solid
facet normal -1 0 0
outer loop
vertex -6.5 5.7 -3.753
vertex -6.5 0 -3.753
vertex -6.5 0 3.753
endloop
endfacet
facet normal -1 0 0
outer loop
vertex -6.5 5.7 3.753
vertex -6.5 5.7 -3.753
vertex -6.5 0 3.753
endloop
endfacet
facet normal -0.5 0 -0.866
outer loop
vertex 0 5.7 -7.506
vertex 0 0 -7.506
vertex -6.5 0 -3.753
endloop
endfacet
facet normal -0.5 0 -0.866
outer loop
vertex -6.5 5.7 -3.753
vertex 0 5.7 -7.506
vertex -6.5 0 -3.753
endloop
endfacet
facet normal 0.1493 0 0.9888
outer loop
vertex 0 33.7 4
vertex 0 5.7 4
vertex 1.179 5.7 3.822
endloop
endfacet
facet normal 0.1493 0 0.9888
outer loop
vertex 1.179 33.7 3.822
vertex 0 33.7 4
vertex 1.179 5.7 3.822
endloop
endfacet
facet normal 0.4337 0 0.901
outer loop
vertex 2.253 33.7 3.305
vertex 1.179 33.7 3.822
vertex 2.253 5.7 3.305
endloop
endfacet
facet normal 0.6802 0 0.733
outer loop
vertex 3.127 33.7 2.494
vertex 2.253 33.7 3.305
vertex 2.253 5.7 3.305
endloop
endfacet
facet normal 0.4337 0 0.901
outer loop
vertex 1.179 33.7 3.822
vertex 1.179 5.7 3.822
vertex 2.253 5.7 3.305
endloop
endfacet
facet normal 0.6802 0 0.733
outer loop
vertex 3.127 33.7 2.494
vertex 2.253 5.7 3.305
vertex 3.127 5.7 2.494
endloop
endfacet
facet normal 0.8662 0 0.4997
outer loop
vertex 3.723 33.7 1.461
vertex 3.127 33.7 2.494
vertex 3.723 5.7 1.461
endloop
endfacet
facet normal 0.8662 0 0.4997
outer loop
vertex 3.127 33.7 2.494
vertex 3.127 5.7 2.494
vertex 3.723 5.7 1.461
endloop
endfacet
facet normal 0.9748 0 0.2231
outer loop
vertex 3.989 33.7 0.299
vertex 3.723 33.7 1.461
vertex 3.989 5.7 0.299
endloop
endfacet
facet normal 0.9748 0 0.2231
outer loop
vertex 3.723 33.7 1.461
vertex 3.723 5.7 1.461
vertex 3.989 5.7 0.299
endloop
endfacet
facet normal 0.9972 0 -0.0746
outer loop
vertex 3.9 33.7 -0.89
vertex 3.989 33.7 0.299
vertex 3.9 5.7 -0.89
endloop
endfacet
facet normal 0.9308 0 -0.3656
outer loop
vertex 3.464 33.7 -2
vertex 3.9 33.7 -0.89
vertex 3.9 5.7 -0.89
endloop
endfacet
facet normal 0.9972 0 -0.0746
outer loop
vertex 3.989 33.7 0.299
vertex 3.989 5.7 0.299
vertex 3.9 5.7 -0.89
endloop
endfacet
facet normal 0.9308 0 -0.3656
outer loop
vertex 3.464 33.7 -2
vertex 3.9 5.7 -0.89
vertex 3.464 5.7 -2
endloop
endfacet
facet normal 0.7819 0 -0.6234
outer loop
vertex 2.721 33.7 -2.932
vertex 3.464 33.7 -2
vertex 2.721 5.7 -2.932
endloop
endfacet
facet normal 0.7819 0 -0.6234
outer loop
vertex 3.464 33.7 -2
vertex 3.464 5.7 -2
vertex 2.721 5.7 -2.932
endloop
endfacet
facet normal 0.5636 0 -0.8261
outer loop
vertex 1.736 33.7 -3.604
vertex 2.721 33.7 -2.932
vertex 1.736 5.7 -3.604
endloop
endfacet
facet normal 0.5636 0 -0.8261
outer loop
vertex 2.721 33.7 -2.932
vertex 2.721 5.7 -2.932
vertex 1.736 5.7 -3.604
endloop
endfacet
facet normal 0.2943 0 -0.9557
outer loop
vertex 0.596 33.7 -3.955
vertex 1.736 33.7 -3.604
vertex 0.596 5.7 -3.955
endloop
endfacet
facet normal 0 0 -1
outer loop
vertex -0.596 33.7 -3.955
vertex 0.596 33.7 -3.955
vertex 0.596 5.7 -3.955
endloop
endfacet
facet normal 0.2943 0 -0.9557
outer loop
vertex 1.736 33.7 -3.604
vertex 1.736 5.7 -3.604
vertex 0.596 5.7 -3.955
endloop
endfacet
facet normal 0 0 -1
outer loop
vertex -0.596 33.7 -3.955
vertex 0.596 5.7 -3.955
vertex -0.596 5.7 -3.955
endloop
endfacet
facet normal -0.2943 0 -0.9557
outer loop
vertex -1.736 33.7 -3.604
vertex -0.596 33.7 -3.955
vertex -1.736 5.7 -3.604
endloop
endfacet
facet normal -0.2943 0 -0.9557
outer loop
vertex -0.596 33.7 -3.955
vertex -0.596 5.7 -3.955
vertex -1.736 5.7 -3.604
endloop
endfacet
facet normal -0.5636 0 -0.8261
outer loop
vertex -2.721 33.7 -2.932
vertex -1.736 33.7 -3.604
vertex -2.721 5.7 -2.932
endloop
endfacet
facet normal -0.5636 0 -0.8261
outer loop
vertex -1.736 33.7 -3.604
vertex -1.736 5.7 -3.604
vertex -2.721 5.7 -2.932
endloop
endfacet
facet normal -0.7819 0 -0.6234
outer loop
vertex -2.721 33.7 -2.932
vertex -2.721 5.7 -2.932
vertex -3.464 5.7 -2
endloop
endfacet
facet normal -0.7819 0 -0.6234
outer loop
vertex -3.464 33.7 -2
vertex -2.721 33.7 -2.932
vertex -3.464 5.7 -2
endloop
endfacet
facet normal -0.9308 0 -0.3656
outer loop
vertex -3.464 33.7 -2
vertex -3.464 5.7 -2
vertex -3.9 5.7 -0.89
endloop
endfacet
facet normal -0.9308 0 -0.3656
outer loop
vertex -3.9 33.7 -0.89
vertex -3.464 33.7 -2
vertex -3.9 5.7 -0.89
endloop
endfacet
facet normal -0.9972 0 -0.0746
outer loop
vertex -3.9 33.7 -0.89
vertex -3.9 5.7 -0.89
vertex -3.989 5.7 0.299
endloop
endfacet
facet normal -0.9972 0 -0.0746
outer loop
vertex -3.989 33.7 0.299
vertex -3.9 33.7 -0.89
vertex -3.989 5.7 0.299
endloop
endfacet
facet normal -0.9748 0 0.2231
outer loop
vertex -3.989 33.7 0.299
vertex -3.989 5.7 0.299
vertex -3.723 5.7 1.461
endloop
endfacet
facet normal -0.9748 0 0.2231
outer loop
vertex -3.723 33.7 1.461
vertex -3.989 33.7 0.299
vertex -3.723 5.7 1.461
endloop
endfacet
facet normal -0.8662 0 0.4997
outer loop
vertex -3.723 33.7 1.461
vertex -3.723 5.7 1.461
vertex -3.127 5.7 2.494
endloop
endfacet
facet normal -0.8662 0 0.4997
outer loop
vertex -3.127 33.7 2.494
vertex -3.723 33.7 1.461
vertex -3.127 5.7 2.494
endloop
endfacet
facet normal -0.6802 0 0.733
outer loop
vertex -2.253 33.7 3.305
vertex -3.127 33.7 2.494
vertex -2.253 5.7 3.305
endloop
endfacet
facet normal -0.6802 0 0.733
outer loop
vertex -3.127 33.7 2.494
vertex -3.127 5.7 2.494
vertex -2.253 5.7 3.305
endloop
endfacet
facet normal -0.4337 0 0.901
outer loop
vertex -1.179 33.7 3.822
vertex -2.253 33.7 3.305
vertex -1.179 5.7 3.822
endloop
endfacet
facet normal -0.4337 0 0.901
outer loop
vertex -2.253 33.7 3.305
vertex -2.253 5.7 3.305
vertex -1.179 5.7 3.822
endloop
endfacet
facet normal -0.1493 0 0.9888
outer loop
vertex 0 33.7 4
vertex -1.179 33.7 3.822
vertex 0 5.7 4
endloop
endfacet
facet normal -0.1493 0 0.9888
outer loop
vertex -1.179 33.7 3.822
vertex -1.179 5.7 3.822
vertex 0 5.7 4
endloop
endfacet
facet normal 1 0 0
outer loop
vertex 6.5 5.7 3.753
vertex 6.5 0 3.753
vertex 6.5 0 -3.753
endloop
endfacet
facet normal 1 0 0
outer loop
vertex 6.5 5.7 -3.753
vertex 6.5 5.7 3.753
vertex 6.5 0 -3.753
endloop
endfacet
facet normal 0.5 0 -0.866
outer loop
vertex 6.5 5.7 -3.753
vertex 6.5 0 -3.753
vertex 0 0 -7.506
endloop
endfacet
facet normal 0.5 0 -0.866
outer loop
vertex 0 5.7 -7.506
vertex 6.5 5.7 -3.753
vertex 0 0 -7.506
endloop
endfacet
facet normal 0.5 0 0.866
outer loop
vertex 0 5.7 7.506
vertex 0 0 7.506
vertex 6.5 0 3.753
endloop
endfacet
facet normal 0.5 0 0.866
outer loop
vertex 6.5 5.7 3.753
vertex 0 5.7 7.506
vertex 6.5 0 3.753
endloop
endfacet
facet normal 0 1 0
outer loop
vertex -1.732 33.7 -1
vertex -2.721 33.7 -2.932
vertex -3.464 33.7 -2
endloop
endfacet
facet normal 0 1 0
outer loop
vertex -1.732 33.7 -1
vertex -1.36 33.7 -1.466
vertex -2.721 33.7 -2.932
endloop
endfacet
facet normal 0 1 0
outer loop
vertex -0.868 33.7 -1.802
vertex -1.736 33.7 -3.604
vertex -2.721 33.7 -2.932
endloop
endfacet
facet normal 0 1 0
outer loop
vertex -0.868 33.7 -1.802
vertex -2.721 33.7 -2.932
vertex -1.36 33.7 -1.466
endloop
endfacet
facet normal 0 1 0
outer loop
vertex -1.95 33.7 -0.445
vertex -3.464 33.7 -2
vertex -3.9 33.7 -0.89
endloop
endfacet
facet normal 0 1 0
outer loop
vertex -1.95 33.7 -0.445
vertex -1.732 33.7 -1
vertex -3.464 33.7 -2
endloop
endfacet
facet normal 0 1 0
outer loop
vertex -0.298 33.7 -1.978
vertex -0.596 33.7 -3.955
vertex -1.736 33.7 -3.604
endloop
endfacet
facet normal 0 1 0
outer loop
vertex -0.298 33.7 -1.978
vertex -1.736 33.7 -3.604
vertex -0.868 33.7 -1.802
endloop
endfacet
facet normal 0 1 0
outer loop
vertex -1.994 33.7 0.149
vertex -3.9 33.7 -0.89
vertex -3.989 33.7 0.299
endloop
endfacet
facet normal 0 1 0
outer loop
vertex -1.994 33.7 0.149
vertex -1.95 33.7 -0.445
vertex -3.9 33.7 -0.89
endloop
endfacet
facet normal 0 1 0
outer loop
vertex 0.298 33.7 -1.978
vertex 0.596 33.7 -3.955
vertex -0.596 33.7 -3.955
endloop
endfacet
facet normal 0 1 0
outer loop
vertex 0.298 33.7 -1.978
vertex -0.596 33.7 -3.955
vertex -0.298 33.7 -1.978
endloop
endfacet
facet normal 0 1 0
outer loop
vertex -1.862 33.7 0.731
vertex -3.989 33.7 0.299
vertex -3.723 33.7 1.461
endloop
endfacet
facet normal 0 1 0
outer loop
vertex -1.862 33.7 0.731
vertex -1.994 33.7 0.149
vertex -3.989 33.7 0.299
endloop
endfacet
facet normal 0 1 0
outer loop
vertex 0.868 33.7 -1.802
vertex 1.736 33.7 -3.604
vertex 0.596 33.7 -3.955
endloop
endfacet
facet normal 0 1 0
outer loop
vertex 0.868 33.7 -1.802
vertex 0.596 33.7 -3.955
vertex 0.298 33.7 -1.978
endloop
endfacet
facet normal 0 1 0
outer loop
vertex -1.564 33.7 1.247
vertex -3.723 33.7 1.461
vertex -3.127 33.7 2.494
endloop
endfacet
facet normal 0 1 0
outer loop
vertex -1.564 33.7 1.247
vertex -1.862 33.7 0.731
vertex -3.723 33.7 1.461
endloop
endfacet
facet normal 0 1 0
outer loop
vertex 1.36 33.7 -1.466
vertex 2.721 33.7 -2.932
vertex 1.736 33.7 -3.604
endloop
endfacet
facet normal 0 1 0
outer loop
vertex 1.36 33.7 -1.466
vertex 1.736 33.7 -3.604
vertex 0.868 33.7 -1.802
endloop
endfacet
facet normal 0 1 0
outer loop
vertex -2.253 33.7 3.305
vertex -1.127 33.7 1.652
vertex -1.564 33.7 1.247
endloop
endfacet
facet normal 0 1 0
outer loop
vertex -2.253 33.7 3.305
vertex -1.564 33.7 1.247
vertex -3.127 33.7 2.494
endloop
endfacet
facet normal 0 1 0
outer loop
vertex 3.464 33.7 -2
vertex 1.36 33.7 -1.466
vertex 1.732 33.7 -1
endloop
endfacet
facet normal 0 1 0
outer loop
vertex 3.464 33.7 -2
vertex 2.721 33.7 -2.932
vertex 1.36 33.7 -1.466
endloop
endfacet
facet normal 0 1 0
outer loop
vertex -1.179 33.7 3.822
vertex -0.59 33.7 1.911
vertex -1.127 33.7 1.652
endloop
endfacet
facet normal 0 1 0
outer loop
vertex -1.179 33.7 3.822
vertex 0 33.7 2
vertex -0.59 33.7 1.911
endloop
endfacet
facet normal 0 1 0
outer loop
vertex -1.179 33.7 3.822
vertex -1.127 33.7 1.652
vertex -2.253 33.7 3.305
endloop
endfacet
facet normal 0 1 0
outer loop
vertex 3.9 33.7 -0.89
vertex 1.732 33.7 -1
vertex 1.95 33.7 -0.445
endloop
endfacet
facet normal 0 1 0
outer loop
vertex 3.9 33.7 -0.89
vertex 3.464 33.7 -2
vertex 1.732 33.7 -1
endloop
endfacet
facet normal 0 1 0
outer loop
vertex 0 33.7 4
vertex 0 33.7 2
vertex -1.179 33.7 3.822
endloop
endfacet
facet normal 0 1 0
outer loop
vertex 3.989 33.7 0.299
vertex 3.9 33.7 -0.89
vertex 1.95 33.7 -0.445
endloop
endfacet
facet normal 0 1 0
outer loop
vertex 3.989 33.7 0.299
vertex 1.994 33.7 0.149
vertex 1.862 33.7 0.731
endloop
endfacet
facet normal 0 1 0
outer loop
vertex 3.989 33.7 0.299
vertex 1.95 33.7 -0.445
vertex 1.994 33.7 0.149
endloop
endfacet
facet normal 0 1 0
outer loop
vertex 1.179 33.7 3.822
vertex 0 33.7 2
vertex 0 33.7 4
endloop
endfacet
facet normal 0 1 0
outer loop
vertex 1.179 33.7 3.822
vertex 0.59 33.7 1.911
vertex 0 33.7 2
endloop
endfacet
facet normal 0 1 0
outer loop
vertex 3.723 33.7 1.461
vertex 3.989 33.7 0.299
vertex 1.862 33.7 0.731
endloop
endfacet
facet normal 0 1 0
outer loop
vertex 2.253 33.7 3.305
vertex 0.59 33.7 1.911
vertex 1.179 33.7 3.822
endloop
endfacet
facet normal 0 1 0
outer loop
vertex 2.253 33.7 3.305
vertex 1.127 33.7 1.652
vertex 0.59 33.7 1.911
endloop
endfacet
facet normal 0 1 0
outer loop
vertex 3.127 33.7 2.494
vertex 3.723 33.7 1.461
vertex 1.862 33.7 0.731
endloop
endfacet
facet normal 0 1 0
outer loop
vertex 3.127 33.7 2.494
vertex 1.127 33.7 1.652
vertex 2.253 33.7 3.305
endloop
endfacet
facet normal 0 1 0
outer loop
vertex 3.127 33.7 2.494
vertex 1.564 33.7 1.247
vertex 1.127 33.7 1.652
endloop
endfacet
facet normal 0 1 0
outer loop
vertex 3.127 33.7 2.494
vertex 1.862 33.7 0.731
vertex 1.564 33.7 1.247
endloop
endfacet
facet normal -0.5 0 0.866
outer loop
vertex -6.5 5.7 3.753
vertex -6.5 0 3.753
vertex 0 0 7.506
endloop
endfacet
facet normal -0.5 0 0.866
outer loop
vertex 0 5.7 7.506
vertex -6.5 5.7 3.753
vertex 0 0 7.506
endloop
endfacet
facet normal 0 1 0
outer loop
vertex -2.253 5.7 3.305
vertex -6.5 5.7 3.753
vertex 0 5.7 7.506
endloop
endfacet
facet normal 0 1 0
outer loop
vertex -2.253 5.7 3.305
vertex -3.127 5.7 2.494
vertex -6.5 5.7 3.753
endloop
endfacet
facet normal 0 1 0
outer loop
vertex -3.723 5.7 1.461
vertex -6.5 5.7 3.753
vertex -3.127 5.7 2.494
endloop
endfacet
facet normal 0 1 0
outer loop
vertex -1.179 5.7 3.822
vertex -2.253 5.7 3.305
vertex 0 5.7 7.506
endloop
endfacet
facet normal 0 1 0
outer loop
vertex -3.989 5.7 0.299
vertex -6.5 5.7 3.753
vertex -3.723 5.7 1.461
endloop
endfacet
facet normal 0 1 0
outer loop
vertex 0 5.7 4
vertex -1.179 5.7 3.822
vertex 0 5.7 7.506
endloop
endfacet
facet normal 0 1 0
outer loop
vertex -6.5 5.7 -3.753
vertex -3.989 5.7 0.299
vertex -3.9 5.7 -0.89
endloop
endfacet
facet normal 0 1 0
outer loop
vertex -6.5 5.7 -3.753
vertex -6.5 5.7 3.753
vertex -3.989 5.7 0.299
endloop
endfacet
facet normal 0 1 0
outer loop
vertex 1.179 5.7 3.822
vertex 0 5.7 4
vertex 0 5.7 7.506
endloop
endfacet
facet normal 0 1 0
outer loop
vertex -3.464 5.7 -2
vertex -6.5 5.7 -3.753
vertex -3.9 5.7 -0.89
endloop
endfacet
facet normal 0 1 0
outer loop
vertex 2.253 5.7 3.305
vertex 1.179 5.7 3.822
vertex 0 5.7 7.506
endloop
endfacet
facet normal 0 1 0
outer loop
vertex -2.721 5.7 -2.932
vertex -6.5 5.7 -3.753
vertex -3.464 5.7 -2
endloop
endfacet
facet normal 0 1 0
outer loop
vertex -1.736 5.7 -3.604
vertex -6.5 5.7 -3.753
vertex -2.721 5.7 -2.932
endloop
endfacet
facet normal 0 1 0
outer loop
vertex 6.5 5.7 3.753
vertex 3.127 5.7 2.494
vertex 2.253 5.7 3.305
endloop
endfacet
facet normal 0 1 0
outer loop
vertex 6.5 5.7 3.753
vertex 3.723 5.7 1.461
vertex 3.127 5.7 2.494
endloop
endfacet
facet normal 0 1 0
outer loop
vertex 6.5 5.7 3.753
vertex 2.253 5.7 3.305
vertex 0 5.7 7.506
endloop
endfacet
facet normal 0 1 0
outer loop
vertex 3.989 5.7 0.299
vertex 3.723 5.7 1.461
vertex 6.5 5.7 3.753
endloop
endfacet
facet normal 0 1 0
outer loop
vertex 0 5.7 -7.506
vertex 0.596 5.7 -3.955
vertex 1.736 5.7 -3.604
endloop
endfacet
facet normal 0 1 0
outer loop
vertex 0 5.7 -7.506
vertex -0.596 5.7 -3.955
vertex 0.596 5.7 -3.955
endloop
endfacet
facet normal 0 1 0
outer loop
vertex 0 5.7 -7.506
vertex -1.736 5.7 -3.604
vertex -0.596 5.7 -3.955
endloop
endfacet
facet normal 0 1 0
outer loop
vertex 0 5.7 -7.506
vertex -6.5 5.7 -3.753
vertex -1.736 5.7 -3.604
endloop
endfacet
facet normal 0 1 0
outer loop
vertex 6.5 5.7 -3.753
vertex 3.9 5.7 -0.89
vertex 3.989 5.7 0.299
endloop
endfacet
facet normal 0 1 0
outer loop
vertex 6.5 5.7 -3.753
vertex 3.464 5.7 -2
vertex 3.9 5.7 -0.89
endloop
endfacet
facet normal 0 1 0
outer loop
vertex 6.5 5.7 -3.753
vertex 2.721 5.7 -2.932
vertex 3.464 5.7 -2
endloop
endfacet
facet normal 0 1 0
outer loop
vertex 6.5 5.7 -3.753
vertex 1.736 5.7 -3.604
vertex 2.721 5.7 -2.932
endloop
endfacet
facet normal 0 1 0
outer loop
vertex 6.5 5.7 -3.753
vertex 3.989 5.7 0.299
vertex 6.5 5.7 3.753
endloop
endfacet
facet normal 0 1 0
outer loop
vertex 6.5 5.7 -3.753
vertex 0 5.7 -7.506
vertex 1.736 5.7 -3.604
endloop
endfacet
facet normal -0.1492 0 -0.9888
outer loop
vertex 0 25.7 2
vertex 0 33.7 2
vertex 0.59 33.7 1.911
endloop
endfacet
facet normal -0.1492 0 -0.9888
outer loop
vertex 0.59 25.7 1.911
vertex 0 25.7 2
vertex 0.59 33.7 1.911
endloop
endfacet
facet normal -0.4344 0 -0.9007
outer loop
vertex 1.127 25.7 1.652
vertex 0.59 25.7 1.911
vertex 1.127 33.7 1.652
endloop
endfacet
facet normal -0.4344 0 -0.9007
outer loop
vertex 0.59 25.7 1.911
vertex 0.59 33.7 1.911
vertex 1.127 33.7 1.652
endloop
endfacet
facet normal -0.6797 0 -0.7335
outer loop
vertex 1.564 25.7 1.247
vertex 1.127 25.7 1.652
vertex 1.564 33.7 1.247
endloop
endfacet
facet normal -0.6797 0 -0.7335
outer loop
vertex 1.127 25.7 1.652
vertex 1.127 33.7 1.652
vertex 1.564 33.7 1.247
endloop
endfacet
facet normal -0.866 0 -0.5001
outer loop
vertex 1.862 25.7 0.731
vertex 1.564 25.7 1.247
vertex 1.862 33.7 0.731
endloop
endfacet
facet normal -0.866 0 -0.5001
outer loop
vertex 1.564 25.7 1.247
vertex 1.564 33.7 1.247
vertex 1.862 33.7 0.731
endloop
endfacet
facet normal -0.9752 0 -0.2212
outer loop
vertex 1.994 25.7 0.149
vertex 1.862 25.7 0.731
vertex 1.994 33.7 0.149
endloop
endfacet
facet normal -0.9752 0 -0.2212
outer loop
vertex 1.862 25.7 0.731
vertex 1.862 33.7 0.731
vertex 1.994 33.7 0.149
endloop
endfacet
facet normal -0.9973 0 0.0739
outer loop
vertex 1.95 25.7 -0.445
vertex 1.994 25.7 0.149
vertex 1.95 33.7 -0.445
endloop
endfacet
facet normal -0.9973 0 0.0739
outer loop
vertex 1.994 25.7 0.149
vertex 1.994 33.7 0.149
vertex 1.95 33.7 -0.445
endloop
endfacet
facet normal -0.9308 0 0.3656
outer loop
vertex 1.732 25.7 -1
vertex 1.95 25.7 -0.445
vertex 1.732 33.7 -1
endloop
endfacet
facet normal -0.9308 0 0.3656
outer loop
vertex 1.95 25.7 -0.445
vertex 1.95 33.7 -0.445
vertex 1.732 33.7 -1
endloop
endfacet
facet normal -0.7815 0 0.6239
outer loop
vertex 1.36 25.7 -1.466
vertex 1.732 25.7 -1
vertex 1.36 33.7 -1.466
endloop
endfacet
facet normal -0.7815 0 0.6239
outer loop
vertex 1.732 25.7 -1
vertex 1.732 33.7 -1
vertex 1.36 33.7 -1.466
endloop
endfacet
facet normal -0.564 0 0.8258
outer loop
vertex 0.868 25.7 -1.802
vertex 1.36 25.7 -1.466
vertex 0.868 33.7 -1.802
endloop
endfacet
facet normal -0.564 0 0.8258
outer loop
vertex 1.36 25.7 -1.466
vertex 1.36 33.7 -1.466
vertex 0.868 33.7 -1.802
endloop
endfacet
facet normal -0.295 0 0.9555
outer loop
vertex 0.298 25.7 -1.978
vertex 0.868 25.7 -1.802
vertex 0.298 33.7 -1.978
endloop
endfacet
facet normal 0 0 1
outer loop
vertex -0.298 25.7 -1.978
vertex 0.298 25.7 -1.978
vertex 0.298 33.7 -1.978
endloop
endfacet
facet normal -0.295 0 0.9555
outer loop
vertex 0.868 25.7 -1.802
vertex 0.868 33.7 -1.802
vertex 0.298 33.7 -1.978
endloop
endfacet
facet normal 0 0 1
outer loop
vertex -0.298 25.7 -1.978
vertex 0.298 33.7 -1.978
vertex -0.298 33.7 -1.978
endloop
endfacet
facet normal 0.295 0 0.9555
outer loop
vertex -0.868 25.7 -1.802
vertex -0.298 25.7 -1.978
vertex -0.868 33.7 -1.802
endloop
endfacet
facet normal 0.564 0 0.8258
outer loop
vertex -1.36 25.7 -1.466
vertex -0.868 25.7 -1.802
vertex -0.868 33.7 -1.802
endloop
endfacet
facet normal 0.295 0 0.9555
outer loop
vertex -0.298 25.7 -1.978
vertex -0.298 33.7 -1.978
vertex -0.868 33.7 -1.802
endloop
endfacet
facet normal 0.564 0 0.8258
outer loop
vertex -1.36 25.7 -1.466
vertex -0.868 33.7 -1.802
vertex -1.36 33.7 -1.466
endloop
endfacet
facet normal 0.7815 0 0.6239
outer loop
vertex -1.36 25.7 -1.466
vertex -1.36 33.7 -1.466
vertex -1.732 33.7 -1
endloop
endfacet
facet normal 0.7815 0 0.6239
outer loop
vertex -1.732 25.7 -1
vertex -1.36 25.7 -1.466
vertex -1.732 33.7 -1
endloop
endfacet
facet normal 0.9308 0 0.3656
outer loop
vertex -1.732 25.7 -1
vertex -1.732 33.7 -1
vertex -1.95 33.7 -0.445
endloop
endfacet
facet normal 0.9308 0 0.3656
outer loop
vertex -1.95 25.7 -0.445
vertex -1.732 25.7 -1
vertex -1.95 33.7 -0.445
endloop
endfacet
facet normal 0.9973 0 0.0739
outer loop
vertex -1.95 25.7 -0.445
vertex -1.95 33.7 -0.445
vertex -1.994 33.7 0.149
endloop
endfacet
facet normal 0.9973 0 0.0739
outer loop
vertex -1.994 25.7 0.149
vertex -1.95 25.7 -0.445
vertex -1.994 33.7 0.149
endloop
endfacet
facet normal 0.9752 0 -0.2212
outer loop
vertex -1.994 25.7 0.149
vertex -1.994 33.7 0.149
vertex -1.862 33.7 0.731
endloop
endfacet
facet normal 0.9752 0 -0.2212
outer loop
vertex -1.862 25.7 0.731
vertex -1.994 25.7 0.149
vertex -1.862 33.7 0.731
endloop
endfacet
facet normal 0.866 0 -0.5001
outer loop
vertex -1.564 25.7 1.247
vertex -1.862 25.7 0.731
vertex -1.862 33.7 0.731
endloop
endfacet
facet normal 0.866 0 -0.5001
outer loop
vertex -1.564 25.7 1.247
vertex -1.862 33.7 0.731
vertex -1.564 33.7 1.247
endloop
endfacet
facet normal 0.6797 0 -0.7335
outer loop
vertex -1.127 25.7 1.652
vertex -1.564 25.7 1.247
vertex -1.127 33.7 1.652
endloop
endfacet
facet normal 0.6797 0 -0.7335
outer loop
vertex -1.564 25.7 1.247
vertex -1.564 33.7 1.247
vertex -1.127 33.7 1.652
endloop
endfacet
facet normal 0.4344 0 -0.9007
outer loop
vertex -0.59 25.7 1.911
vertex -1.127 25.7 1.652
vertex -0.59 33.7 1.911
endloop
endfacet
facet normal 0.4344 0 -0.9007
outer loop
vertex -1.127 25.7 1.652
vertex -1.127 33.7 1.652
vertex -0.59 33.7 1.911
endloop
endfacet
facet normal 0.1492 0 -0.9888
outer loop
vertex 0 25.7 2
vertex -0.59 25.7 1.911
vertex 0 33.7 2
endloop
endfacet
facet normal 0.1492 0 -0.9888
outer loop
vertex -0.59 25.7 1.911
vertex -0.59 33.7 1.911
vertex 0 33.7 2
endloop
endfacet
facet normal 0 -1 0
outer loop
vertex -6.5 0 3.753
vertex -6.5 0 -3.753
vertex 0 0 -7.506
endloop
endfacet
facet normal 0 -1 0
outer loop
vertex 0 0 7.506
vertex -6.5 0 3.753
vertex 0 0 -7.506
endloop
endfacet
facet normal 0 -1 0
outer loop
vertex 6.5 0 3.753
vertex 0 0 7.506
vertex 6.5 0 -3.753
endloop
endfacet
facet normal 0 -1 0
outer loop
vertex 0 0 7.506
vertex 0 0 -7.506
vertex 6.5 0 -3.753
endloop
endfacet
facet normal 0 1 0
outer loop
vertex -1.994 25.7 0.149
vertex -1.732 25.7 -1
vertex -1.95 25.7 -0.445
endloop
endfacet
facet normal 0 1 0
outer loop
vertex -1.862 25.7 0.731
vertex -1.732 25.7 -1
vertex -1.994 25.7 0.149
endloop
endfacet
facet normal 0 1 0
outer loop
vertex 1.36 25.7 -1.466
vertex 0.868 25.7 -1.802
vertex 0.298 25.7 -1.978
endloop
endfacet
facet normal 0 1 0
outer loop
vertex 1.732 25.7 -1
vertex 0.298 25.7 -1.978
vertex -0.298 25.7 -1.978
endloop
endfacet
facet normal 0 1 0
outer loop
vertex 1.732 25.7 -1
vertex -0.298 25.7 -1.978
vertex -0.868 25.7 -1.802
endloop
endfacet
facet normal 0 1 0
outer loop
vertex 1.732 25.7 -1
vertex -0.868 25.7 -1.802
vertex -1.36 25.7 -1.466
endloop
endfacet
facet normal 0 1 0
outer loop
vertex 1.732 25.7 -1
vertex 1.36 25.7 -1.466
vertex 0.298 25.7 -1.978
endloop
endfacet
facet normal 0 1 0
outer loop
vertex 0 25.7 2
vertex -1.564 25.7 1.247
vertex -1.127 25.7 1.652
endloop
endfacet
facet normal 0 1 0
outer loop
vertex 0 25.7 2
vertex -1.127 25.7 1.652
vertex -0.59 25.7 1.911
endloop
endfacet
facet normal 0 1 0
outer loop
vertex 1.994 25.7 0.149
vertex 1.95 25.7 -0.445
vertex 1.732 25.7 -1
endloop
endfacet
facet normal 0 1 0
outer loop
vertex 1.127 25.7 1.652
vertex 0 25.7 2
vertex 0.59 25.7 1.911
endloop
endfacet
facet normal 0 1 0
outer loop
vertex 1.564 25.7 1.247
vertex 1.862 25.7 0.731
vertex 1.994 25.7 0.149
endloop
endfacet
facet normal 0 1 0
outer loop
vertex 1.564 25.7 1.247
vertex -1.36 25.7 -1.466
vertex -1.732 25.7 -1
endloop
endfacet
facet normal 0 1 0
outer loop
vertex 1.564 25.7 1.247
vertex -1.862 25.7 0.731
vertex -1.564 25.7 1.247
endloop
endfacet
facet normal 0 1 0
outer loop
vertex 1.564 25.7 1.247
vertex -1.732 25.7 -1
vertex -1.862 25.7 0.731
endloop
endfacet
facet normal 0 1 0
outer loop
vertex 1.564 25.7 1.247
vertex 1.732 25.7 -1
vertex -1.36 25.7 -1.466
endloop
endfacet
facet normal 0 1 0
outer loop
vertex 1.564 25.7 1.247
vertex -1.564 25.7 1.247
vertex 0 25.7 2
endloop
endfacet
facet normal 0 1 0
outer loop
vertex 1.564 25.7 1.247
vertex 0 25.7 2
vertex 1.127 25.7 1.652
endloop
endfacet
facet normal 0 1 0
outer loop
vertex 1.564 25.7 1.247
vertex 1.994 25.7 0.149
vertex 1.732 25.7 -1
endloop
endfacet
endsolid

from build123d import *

# Parameters (mm, degrees)
BOSS_EXTRUDE1_DEPTH = 5.7
SKETCH2_R           = 4
BOSS_EXTRUDE2_DEPTH = 28
SKETCH3_R           = 2
CUT_EXTRUDE1_DEPTH  = 8


with BuildPart() as part:
    # Sketch1 → Boss-Extrude1 (new body)
    with BuildSketch(Plane(origin=(0, 0, 0), x_dir=(1, 0, 0), z_dir=(0, 1, 0))):
        Polygon((0, -7.505553499), (6.5, -3.75277675), (6.5, 3.75277675), (0, 7.505553499), (-6.5, 3.75277675), (-6.5, -3.75277675), align=None)
    extrude(amount=BOSS_EXTRUDE1_DEPTH)

    # Sketch2 → Boss-Extrude2 (add)
    with BuildSketch(Plane(origin=(0, 5.7, 0), x_dir=(1, 0, 0), z_dir=(0, 1, 0))):
        with Locations(Location((0, 0, 0), (0, 0, 270))):
            Circle(SKETCH2_R)
    extrude(amount=BOSS_EXTRUDE2_DEPTH)

    # Sketch3 → Cut-Extrude1 (cut)
    with BuildSketch(Plane(origin=(0, 33.7, 0), x_dir=(1, 0, 0), z_dir=(0, 1, 0))):
        with Locations(Location((0, 0, 0), (0, 0, 270))):
            Circle(SKETCH3_R)
    extrude(amount=-CUT_EXTRUDE1_DEPTH, mode=Mode.SUBTRACT)


solid = part.part
